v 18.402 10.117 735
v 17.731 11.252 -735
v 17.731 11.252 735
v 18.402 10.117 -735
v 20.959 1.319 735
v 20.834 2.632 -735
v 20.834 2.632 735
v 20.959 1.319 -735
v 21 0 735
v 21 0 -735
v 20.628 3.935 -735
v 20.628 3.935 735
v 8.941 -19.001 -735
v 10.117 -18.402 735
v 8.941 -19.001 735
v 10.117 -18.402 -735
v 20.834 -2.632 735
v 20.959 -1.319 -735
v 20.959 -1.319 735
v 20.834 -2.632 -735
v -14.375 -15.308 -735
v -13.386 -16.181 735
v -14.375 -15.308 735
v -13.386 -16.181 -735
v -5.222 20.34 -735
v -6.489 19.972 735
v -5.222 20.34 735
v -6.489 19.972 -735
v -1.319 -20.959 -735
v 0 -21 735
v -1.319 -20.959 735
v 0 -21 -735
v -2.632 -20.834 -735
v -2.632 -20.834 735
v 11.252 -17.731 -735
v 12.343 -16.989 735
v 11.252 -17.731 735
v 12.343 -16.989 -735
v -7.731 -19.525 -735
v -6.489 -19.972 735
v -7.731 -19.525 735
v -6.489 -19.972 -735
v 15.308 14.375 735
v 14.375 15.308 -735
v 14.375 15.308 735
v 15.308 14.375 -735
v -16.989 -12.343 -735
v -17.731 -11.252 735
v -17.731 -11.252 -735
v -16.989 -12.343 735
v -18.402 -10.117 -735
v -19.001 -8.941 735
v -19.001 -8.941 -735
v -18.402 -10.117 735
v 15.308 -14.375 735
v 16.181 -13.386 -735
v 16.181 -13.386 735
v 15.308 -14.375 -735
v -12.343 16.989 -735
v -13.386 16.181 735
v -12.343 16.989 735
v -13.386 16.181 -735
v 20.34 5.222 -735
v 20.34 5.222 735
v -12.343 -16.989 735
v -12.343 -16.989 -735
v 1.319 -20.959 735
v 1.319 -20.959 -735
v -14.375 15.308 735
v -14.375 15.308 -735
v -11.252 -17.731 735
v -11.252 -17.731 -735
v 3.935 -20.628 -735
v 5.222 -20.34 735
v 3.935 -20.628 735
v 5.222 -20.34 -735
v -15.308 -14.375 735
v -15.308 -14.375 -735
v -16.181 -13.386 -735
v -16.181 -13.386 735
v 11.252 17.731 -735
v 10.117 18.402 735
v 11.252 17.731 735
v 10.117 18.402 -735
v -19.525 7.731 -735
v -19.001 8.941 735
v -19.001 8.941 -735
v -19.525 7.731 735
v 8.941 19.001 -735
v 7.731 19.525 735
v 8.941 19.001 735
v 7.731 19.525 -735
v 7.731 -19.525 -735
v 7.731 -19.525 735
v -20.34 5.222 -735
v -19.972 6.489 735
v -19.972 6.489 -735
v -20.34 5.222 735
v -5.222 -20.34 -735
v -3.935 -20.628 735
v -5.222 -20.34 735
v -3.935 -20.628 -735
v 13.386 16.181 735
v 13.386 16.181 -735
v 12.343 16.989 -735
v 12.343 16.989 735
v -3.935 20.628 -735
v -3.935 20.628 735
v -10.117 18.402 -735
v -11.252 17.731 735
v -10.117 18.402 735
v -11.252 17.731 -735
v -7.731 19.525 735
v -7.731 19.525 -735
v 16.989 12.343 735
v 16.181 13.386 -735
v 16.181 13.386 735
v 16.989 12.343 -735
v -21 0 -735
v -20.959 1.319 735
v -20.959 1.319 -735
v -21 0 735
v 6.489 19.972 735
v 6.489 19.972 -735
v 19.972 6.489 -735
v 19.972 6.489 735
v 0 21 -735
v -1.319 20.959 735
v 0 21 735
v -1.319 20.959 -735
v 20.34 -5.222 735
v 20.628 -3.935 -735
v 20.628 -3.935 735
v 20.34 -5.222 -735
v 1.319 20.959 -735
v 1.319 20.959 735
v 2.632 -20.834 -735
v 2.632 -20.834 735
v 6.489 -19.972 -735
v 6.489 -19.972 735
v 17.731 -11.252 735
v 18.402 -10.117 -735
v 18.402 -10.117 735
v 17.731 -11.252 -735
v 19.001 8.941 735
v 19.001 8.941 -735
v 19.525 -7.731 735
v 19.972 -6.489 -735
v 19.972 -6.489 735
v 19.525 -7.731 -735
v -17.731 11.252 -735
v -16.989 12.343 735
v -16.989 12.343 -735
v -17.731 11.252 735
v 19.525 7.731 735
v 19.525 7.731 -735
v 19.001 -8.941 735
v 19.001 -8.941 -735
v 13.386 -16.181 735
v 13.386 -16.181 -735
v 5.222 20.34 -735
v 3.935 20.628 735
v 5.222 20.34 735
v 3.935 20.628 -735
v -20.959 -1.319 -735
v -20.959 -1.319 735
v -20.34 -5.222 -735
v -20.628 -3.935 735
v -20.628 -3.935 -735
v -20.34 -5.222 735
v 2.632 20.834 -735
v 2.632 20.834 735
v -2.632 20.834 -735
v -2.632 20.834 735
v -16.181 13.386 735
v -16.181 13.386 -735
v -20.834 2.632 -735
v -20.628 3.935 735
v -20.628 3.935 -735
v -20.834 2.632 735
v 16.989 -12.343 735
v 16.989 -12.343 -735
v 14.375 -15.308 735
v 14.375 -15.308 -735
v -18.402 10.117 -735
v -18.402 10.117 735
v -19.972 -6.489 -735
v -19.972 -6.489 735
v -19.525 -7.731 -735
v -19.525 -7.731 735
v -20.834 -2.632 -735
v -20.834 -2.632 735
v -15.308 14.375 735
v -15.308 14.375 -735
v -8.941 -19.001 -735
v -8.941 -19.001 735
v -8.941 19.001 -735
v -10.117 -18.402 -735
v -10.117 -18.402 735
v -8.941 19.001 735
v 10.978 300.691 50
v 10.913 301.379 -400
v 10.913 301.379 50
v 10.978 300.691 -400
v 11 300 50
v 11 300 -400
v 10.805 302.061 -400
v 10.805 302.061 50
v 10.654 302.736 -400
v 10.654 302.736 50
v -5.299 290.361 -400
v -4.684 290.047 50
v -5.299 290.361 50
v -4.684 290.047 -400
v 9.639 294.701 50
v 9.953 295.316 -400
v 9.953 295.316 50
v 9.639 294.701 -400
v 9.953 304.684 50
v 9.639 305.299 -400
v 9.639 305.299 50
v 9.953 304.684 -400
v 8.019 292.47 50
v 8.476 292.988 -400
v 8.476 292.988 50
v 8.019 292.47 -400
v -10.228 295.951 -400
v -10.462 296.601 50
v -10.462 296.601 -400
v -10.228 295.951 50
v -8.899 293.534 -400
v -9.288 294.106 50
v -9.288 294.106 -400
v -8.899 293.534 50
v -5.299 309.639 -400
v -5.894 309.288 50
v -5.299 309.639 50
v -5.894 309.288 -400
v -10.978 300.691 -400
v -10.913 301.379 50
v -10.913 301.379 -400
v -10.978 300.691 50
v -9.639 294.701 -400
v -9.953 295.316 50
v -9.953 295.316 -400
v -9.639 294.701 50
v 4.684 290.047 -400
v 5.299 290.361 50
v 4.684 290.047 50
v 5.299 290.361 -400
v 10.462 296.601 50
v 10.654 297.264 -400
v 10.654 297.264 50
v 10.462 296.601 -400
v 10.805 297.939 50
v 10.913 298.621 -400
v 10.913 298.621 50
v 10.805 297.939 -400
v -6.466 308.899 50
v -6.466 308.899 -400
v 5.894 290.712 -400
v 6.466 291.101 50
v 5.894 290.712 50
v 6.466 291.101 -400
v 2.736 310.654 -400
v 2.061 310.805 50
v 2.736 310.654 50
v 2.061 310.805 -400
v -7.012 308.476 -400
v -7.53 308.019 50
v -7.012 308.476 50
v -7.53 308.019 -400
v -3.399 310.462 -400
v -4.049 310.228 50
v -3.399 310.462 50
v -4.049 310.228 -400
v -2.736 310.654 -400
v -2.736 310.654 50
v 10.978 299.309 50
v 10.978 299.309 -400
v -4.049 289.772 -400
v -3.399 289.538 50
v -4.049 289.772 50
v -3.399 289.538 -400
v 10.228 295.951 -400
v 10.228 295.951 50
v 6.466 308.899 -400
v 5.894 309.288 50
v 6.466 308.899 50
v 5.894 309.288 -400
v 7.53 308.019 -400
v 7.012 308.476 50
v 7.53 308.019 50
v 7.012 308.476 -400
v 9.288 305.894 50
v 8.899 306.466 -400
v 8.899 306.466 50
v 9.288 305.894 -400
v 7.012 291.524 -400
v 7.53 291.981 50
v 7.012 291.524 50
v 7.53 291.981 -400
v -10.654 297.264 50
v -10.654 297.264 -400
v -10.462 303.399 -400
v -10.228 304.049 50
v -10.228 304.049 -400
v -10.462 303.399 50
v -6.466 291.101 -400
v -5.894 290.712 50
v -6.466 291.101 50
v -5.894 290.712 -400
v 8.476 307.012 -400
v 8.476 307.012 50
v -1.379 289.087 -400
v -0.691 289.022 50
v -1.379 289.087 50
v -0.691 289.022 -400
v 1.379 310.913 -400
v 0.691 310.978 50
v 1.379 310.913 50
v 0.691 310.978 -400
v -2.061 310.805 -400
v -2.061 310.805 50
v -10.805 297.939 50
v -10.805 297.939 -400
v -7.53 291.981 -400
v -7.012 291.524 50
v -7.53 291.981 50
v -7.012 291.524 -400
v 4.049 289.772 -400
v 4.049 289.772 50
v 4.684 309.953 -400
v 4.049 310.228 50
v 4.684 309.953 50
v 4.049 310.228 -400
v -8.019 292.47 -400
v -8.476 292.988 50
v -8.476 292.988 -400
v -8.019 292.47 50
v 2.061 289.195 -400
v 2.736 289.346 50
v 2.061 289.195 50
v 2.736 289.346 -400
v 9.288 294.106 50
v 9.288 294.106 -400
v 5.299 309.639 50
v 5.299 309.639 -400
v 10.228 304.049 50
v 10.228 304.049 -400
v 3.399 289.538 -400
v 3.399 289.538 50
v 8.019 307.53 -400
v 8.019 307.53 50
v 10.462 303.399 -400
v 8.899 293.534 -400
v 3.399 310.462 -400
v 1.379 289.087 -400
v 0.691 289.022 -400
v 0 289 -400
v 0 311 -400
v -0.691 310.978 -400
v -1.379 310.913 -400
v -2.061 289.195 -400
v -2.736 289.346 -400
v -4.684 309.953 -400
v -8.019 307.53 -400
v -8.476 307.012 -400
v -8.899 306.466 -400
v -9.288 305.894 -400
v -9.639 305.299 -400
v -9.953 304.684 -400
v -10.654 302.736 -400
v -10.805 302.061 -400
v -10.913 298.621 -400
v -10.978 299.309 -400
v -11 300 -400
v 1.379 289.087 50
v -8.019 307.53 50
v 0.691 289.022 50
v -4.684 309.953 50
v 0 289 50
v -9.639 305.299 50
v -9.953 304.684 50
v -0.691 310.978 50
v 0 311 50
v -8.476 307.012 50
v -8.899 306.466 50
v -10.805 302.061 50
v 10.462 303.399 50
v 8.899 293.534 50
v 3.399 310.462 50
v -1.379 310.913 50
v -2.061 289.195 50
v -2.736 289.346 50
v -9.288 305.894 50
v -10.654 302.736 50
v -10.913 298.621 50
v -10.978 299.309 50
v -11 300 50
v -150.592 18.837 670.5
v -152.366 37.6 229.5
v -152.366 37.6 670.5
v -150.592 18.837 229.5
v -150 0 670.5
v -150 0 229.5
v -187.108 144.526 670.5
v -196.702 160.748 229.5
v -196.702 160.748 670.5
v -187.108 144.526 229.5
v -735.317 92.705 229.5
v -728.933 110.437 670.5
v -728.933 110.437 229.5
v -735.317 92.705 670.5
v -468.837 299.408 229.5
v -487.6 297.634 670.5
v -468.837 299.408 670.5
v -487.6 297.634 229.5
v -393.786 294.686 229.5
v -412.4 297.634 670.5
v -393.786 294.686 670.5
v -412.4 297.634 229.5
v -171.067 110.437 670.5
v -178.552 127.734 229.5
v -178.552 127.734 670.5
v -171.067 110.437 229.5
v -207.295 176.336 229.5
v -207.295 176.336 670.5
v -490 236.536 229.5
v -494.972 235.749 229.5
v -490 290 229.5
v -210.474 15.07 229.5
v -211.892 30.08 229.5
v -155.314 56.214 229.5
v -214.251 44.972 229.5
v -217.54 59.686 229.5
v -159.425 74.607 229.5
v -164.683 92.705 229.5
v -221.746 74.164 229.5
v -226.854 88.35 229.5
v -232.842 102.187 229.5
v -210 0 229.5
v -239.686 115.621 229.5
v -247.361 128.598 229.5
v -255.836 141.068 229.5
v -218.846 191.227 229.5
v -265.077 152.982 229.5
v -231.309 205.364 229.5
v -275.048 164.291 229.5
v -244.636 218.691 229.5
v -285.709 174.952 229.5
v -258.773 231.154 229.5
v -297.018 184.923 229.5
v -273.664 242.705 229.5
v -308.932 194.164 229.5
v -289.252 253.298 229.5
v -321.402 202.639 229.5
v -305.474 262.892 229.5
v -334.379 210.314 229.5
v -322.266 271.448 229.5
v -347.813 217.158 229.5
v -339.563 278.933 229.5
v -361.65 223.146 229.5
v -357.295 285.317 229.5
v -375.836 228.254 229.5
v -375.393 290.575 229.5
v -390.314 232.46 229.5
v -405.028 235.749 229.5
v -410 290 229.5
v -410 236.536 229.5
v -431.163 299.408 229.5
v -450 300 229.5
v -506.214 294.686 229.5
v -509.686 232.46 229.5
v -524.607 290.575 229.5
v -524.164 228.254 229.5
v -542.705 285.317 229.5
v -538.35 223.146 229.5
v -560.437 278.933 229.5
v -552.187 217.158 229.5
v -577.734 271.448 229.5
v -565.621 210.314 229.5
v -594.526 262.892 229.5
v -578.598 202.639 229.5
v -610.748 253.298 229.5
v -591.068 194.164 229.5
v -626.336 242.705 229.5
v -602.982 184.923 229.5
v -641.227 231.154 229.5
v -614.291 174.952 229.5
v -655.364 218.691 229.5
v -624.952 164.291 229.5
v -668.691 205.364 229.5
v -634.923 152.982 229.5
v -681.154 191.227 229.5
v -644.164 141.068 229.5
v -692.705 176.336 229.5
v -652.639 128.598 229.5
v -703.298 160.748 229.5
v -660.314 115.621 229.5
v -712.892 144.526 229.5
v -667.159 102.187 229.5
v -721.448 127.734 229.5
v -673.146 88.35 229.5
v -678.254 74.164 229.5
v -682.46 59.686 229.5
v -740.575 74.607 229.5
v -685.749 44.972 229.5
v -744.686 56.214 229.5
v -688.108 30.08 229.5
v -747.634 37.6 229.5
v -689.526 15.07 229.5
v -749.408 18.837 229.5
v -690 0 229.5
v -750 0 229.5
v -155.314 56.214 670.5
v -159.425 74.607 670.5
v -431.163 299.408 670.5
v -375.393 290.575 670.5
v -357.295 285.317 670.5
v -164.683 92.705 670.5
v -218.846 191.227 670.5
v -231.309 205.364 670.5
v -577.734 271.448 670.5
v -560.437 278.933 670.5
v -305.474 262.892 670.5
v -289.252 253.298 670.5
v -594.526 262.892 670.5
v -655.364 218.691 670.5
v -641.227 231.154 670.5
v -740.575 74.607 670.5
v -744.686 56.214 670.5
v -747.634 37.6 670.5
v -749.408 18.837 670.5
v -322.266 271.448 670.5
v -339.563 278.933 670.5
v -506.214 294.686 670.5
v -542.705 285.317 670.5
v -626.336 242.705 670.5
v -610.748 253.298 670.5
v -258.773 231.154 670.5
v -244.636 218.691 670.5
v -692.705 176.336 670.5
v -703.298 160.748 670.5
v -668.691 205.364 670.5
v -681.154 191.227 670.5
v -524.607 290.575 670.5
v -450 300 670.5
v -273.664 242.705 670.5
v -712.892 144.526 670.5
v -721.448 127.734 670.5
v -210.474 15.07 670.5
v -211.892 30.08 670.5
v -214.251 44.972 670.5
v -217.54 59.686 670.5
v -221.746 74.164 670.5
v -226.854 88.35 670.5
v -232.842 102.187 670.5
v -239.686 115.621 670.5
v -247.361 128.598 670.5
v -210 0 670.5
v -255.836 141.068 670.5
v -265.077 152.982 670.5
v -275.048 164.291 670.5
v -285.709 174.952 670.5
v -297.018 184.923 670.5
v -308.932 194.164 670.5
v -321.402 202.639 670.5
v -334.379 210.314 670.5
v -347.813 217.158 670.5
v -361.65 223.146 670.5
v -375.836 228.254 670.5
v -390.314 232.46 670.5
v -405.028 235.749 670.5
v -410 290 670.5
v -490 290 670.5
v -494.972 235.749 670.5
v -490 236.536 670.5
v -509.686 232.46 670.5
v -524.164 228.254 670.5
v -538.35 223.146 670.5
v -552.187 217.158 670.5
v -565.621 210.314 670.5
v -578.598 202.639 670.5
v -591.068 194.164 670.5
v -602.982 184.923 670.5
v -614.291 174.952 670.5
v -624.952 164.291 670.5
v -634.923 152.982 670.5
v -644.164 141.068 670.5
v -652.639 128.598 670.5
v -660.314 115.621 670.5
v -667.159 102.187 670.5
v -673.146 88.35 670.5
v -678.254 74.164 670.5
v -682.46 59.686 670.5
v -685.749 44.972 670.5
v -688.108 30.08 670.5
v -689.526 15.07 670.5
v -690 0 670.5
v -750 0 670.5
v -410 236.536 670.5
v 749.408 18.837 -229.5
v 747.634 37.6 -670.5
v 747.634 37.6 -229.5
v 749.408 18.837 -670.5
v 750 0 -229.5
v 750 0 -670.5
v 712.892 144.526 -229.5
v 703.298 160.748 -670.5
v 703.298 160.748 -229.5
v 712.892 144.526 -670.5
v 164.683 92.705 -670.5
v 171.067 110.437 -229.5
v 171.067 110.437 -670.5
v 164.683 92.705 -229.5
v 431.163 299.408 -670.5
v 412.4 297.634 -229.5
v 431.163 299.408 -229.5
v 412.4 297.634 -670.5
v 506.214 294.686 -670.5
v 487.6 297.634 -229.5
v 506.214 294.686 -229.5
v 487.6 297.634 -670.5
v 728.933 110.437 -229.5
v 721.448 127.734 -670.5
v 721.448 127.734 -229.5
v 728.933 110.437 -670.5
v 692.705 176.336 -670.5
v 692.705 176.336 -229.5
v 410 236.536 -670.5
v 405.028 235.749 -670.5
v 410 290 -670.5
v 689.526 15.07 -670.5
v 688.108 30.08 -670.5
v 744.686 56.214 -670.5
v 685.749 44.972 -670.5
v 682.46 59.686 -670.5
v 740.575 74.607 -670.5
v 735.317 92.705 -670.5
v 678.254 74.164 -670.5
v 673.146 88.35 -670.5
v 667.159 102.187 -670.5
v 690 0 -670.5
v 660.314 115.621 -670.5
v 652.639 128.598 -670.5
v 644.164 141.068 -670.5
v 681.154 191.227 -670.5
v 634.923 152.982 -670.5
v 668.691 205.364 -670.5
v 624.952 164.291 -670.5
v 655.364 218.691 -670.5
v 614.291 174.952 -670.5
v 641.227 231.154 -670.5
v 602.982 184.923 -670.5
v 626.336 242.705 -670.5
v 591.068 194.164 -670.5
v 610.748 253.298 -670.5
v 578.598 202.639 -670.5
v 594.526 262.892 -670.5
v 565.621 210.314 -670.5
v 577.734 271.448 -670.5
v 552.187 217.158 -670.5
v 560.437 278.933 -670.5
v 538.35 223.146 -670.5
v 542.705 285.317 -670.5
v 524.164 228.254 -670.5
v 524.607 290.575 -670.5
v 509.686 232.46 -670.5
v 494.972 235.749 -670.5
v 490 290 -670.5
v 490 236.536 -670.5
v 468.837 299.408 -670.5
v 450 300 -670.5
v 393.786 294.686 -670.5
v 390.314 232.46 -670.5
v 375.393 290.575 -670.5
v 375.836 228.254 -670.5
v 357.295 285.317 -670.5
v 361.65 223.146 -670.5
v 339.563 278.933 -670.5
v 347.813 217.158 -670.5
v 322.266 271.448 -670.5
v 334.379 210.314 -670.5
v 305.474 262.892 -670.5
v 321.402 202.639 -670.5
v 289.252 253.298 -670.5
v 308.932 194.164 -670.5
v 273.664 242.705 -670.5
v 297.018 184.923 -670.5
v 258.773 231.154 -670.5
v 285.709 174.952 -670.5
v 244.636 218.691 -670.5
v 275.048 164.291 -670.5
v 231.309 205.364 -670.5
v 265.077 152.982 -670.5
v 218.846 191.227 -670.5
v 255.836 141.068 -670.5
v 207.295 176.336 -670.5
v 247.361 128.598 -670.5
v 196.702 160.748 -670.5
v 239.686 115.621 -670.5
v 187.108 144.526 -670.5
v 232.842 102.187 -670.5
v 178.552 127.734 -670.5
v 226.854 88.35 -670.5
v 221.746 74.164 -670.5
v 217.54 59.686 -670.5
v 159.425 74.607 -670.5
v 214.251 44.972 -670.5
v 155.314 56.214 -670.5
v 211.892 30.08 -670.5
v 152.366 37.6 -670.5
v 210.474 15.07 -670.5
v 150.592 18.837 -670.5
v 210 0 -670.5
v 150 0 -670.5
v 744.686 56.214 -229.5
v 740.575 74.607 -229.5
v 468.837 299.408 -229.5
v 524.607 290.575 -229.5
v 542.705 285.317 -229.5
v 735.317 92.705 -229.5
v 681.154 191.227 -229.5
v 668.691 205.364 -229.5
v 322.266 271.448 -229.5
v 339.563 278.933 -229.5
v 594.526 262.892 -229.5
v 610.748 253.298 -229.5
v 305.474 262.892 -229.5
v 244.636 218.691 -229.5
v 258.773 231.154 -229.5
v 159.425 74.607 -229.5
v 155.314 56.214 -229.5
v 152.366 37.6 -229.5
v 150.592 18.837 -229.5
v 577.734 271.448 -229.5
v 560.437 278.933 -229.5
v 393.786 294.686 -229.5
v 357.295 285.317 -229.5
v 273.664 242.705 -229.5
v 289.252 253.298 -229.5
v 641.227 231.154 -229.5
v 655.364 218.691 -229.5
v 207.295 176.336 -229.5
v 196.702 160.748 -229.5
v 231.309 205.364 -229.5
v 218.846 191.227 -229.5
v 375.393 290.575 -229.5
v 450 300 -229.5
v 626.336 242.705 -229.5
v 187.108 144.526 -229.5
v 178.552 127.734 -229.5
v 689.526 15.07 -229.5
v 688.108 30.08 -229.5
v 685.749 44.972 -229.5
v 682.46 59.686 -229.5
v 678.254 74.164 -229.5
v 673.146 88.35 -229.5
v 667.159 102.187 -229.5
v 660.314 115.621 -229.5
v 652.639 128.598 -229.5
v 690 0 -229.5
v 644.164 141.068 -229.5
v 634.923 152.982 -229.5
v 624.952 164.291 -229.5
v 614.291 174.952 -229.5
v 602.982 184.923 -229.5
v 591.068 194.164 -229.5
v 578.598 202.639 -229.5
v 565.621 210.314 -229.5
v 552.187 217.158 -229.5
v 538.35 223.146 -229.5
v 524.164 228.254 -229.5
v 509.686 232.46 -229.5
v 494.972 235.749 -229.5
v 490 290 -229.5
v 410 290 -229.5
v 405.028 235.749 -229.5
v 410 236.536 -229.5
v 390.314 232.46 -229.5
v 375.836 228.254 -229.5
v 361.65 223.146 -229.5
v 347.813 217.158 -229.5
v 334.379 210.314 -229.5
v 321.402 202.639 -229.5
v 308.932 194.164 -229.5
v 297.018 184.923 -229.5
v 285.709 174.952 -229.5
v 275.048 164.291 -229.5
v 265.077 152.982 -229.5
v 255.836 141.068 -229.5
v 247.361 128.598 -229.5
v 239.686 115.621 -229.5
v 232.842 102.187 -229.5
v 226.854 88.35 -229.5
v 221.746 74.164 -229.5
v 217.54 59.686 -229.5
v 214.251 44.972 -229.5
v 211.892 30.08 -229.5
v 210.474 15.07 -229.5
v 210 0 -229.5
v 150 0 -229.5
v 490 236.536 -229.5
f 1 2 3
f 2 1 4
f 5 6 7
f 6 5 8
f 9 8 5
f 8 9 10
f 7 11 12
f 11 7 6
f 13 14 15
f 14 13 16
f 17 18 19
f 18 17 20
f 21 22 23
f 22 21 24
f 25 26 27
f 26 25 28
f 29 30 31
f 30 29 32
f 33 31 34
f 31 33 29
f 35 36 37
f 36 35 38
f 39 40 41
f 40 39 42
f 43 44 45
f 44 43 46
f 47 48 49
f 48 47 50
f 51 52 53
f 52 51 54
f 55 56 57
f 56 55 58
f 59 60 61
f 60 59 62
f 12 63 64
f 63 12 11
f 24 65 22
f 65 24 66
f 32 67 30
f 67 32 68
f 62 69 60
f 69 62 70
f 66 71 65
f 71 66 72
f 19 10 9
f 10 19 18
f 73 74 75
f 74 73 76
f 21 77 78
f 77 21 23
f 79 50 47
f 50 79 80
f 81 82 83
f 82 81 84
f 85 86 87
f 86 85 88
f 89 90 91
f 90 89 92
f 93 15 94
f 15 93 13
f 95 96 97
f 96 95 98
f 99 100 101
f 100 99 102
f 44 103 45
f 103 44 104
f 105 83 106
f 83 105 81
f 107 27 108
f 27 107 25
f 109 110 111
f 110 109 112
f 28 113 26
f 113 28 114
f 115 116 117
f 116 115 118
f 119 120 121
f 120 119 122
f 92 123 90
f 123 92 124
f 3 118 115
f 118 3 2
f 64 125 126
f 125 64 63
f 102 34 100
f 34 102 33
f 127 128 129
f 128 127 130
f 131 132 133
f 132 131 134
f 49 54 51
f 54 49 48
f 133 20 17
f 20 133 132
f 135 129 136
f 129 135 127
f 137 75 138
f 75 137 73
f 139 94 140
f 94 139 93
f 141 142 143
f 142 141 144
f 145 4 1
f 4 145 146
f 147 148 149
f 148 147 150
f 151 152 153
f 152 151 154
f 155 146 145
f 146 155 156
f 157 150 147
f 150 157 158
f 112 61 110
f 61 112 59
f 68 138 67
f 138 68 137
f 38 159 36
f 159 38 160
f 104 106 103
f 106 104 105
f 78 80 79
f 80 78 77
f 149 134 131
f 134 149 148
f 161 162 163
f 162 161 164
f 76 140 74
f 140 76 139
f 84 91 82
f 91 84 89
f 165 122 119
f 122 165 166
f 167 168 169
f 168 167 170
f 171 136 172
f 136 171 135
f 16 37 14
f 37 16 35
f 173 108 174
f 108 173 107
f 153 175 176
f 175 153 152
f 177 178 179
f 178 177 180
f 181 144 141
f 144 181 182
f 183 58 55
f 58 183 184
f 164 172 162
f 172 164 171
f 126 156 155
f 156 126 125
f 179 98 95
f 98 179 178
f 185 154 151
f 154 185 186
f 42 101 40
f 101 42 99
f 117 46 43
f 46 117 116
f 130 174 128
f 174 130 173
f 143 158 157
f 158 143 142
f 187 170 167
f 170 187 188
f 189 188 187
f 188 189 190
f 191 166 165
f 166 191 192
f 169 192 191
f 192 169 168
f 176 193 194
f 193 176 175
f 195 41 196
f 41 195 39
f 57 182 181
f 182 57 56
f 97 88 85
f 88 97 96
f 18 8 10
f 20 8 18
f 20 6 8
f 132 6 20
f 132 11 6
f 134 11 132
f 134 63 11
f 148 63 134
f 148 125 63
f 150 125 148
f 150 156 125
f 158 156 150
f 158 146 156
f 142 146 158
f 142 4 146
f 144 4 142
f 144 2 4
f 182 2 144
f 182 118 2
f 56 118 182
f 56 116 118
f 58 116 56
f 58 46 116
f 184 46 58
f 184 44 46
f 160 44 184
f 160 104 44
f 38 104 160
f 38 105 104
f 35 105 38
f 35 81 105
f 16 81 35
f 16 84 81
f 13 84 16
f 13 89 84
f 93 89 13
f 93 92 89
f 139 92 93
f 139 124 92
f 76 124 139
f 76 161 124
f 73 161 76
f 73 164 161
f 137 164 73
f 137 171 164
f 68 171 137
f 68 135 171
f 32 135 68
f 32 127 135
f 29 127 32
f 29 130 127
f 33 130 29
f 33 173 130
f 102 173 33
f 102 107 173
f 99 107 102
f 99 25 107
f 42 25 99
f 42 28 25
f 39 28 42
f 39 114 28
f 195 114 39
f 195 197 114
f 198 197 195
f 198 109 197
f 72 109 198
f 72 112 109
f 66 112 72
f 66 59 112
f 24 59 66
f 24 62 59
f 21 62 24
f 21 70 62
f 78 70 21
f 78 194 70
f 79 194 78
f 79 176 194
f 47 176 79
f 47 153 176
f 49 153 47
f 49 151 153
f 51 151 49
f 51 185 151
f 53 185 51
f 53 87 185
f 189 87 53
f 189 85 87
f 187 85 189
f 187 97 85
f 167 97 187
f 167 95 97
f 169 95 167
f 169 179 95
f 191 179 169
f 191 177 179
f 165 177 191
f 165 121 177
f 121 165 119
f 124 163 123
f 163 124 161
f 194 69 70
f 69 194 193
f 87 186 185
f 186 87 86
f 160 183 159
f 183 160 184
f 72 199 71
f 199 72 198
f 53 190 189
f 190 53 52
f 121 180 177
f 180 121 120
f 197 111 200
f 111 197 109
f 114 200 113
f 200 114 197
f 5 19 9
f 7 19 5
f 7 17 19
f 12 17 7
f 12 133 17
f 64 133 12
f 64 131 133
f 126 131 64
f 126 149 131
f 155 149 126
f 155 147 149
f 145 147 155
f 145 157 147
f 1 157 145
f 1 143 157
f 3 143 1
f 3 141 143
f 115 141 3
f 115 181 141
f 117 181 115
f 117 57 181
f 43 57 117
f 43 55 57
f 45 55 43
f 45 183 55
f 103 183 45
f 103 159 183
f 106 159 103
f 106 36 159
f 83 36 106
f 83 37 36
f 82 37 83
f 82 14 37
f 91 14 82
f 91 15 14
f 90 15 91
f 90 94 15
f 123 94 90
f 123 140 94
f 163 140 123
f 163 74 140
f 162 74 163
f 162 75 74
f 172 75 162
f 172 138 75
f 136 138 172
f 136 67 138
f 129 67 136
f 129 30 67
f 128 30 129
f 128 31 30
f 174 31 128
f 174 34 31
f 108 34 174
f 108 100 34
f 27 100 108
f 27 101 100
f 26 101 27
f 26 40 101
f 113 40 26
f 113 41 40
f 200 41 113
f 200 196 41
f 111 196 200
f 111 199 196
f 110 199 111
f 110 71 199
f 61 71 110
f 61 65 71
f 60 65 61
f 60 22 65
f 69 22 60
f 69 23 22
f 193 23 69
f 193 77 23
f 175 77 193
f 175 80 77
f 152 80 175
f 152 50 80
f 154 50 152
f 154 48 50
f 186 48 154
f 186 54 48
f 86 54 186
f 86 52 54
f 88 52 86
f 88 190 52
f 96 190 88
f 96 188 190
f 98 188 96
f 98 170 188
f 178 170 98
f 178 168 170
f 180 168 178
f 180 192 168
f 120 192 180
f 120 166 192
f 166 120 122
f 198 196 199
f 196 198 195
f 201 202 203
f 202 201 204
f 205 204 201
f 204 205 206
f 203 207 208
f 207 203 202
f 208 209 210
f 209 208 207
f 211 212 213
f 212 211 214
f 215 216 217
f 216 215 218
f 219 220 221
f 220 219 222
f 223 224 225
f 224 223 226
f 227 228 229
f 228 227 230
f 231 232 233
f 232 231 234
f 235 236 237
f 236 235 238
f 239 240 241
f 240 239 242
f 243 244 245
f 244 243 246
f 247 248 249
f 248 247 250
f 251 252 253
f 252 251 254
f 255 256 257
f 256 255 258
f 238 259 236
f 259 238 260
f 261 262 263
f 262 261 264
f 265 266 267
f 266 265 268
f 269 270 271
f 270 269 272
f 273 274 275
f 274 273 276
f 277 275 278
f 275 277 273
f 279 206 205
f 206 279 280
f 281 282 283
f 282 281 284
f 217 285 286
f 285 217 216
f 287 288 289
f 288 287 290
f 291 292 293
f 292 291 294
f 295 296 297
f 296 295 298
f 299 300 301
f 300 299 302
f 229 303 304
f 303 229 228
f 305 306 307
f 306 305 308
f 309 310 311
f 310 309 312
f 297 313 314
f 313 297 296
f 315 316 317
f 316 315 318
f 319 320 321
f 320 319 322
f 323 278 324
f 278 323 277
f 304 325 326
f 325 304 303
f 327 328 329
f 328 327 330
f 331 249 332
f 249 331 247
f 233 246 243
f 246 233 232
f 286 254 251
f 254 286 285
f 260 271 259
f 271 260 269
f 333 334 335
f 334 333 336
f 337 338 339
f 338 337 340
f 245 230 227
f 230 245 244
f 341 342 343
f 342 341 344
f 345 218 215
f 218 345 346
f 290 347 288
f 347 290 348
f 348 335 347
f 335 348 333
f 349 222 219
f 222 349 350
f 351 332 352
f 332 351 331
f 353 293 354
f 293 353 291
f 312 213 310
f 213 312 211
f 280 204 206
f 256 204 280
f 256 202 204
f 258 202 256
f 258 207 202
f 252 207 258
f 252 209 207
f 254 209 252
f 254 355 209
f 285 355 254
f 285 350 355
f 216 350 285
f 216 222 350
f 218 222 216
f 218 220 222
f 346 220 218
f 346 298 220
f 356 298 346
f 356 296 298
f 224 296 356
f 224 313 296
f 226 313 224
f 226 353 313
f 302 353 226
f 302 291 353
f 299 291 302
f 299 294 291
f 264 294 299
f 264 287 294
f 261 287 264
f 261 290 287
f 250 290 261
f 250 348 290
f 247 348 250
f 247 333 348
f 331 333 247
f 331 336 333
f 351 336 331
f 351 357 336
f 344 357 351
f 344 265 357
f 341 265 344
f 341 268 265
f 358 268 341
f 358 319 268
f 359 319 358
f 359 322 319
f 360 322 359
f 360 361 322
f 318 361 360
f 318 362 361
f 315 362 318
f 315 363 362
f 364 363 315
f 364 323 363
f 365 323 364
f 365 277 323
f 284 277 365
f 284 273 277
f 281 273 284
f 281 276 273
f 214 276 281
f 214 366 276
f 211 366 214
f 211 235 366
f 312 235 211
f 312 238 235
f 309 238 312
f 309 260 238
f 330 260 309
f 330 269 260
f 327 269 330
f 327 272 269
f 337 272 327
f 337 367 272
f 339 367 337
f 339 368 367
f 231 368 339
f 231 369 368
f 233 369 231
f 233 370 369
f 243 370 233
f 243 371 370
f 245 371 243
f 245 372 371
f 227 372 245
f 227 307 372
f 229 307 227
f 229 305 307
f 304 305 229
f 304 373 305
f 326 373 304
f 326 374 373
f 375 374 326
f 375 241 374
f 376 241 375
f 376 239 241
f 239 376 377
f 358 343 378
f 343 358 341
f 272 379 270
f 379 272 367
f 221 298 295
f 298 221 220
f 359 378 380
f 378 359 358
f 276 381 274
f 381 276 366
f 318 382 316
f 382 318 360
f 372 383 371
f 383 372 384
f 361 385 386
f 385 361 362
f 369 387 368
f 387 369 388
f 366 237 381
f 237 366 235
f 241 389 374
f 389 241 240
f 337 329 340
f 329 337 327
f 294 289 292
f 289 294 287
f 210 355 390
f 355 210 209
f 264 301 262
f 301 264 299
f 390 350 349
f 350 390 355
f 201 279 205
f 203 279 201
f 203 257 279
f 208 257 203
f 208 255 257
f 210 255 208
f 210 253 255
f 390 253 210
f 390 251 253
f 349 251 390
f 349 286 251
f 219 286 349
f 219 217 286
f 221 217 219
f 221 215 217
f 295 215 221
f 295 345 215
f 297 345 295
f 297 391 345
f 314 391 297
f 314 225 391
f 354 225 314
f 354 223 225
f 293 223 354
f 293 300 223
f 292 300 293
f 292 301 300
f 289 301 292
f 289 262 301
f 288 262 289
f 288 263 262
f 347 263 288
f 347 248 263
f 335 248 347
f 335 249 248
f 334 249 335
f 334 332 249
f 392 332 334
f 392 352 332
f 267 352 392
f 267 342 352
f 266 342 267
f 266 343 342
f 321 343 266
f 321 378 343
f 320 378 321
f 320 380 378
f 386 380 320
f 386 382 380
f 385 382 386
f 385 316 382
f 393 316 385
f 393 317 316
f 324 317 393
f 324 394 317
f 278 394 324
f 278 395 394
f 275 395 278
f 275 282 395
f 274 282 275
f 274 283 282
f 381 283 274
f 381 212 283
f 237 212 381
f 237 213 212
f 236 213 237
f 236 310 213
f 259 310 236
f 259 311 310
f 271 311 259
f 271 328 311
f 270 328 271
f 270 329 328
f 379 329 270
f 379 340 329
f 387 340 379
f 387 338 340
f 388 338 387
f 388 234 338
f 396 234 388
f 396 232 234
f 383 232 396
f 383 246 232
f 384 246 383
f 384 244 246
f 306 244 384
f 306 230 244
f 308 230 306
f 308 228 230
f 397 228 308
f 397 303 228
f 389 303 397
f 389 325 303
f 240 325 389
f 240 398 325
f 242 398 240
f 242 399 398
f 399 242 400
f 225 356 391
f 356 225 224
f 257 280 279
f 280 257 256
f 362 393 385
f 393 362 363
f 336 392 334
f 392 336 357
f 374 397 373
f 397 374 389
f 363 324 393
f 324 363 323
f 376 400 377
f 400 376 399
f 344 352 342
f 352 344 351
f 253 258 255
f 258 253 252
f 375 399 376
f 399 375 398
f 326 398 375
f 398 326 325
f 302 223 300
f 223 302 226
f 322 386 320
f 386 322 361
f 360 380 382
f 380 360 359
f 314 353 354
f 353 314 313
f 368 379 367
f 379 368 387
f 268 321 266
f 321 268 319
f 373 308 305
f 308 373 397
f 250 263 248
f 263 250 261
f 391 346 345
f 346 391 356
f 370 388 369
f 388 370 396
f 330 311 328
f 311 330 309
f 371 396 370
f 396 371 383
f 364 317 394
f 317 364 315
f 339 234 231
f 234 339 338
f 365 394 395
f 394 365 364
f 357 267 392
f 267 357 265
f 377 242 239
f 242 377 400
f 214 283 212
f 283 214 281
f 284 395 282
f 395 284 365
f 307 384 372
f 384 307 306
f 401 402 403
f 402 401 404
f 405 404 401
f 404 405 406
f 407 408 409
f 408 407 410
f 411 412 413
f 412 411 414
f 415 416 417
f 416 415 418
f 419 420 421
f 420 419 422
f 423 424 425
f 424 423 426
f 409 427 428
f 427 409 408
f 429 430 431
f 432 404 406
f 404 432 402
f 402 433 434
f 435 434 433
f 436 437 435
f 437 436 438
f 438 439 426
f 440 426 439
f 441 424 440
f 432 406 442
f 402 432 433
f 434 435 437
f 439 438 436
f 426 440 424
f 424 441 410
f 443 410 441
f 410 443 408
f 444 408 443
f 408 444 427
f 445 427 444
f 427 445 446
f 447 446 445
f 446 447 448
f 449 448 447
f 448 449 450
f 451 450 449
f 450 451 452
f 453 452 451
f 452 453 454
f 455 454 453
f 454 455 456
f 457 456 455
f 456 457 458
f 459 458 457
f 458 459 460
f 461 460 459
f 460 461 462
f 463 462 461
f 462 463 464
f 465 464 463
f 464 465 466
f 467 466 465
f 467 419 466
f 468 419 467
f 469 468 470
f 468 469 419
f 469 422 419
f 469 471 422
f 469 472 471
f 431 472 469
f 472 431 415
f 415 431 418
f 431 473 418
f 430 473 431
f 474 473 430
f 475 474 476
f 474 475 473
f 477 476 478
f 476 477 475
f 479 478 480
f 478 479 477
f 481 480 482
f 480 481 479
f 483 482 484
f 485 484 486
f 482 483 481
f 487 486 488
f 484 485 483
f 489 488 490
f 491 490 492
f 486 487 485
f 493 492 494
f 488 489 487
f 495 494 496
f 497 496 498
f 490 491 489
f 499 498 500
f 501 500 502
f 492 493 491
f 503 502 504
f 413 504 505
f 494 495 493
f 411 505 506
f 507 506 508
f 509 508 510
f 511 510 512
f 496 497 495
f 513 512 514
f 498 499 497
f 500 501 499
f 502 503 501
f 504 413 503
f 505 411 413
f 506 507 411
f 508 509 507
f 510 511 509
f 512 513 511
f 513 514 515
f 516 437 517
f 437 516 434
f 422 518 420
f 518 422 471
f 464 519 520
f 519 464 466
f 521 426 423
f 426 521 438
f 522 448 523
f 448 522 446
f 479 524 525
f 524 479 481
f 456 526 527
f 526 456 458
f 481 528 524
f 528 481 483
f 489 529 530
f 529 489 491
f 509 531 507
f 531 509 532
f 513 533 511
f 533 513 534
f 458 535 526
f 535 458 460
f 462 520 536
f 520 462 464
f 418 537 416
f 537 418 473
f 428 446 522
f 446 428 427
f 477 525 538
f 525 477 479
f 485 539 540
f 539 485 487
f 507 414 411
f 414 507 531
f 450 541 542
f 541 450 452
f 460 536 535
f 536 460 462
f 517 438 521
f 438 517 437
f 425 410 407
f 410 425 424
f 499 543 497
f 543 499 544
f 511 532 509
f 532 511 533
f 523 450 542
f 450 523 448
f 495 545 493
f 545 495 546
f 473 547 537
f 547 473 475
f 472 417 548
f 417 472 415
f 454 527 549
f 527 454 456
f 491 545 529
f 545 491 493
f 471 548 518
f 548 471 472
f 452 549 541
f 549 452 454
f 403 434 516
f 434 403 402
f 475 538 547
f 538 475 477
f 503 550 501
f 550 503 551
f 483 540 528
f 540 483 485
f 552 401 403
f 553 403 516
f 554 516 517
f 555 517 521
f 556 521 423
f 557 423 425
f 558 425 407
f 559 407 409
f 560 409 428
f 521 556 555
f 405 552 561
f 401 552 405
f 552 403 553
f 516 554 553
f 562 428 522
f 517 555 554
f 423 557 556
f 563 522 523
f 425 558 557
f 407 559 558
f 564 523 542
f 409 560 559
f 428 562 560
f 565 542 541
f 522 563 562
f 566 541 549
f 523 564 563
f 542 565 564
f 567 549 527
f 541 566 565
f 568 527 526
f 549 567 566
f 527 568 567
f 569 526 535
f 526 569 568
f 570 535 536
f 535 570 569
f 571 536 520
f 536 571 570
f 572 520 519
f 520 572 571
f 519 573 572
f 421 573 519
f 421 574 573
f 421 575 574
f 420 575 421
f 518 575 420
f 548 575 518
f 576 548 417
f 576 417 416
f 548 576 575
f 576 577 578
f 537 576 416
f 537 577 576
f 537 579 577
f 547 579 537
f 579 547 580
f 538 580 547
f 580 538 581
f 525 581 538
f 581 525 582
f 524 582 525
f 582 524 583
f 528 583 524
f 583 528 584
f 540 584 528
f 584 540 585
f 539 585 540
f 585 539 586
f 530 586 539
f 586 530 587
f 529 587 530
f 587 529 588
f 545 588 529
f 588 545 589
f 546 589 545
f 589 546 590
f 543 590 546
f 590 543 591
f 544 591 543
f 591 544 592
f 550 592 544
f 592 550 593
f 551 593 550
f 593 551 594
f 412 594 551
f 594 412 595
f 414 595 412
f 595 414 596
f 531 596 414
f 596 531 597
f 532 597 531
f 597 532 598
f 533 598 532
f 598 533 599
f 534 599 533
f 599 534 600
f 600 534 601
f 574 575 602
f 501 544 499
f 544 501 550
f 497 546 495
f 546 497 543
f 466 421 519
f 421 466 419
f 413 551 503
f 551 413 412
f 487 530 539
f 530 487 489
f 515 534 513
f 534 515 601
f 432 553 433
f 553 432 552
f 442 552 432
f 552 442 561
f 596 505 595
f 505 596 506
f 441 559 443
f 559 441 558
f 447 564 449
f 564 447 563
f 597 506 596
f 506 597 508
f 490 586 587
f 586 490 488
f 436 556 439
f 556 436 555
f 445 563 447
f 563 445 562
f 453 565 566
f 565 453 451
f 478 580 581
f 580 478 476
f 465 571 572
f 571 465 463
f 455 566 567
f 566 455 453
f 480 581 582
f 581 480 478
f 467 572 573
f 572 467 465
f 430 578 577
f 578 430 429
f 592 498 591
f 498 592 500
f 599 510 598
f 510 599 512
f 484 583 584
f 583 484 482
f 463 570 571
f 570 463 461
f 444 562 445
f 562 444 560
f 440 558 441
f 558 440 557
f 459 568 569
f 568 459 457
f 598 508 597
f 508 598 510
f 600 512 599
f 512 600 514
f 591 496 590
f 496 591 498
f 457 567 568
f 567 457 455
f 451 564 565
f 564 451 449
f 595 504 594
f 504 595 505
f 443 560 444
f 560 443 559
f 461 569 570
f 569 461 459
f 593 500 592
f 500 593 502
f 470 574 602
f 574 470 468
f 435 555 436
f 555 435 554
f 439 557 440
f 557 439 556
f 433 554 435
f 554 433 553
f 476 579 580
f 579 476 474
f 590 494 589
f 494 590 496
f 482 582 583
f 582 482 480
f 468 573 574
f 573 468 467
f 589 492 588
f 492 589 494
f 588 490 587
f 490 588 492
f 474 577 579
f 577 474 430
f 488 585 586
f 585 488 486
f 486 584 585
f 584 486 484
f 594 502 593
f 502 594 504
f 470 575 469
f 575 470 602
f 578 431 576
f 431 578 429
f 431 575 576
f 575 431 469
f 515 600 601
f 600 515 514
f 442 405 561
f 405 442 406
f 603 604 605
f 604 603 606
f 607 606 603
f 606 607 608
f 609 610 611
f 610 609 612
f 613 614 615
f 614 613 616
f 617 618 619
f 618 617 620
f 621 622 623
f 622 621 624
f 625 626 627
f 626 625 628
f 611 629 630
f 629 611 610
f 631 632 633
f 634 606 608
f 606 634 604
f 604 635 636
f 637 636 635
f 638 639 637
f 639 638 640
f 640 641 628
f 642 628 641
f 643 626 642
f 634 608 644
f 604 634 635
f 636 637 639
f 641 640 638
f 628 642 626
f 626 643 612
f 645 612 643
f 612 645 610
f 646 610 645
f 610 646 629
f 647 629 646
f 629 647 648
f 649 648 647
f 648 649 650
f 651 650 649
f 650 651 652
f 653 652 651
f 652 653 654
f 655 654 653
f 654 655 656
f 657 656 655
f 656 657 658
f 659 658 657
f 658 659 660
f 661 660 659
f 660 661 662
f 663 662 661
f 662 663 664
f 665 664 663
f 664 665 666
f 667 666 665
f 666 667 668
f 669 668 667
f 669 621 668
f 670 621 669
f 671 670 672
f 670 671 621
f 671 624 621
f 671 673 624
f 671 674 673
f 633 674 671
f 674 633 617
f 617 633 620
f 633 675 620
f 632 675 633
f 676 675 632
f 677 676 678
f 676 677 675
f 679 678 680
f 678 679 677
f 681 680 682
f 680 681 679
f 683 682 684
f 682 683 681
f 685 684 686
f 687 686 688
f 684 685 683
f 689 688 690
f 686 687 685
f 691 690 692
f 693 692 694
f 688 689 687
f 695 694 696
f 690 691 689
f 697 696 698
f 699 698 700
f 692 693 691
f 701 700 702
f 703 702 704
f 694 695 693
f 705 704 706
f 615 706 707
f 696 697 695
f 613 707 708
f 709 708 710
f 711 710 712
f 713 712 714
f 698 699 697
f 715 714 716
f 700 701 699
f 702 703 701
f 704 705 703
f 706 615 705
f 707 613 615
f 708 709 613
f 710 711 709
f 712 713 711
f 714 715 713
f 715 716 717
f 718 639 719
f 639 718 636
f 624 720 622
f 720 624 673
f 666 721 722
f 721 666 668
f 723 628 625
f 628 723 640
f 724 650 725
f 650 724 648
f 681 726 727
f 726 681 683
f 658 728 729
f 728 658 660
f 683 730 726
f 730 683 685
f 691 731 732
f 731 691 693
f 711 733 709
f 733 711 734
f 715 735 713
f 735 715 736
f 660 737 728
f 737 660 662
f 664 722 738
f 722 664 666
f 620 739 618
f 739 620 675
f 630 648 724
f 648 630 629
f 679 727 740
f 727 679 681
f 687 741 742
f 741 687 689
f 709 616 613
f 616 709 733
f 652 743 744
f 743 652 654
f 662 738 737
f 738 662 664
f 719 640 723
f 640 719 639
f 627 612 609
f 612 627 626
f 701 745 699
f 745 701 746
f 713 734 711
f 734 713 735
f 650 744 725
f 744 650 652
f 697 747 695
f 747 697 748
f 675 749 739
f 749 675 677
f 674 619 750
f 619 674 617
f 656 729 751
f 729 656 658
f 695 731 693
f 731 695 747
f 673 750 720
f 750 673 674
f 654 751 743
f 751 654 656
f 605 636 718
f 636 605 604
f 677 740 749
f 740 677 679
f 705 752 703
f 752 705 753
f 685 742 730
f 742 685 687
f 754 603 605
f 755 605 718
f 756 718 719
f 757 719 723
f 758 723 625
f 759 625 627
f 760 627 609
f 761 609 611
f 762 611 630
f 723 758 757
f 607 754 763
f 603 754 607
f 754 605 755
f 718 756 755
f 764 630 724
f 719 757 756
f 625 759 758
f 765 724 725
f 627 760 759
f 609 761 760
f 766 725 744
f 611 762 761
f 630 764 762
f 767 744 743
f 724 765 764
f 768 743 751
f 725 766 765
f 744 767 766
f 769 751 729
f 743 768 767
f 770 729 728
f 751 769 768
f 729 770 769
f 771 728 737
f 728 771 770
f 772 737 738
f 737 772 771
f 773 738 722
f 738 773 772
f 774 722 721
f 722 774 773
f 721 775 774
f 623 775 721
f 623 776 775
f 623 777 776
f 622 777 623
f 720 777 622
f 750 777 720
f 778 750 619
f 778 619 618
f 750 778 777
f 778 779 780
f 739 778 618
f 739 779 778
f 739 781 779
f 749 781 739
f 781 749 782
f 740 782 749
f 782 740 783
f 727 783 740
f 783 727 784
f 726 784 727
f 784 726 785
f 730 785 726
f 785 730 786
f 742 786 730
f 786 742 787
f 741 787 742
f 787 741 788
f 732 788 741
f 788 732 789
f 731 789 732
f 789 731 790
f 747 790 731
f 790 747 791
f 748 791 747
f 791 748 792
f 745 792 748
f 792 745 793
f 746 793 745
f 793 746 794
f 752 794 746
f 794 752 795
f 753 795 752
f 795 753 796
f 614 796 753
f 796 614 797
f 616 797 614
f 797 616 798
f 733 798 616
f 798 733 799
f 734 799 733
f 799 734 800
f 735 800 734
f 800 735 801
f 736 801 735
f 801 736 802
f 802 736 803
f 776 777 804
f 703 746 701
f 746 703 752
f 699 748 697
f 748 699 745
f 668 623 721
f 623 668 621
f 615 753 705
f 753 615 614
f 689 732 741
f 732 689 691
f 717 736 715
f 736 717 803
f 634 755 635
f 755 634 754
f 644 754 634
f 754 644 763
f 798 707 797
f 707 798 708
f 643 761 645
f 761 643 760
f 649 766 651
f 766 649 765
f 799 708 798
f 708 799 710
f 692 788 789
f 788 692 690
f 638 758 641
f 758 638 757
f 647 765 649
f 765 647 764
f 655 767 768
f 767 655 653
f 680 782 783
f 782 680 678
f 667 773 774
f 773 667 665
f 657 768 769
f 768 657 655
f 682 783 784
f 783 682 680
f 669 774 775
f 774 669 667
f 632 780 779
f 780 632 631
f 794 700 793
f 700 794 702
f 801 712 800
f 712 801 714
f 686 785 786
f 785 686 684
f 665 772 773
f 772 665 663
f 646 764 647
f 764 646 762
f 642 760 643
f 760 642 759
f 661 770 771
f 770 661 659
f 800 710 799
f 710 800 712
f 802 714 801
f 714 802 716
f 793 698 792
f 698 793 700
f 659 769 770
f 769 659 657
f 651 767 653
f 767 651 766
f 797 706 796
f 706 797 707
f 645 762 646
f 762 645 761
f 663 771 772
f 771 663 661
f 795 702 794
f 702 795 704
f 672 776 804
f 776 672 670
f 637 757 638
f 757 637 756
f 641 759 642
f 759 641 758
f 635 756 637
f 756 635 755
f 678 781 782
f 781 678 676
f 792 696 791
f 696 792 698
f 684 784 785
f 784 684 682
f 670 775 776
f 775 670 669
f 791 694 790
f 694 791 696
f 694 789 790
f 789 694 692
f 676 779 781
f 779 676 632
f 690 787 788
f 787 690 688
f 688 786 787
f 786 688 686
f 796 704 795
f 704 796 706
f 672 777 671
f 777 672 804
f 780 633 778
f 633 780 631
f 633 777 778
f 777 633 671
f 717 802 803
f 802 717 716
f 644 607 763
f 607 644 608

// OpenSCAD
// ============================================================================
// PROJECT: XXXG-00W0 WING GUNDAM ZERO EW - LOWER LIMB ARTICULATION INFRA
// COMPONENT VAULT: BANDAI CAST RUNNER F - KNEE KNUCKLES F1 & F2
// PACKAGING RE-ARCHITECTURE: SUB-ARMOR CAPACITOR RECESSED BANK INTEGRATION
// CONFIG METRIC: SCALED TITANIUM CASTS (1:1 ACTUAL METRIC UP-SCALE)
// ============================================================================

$fn = 100; // Circular segment rendering resolution count

// Structural Constants Scaled 1:1 for a 16.7-Meter Airframe Scale (mm)
knee_joint_length = 980;                // Total longitudinal vertical height (mm)
knee_bore_diameter = 480;               // Core cycloidal hinge pin track width (mm)
armor_skin_thickness = 60;              // Solid TiAl protective plating wall (mm)
harness_conduit_width = 80;             // Cast-in 4oz copper logic trace track (mm)
capacitor_pocket_depth = 15;            // Sub-armor recessed housing pocket depth (mm)
capacitor_pocket_width = 140;           // Transverse MLCC array pocket width (mm)

module Runner_F_Knee_Forge() {
    // Central Supply Injection Runner Axis (Molten Feed Line from Siphon Forge)
    color([0.24, 0.24, 0.26]) {
        cylinder(h = knee_joint_length * 1.5, d = 42, center = true);
        // Direct injection gates tracking straight into the part mold cavities
        translate() rotate() cylinder(h = 450, d = 22);
        translate([0, 300, -400]) rotate() cylinder(h = 450, d = 22);
    }
    
    // Instantiate Scaled Skeutomorphic Part Molds Symmetrically (Left & Right)
    Cast_Internal_Knee_Knuckles();
}

module Cast_Internal_Knee_Knuckles() {
    // ---- PART F1: INTERNAL LEFT STRUCTURAL KNEE JOINT KNUCKLE ---- [Page 7, Step 5 / Page 7, Step 08-1]
    translate([-450, 0, 450]) color([0.35, 0.35, 0.38]) { // Inner Frame Dark Spec
        difference() {
            // Main solid heavy-duty core joint connection block segment
            cylinder(h = knee_joint_length * 0.45, d = knee_bore_diameter + (armor_skin_thickness * 2), center = true);
            
            // Central Cycloidal Reduction Track Bore (Houses pre-loaded rolling pins)
            cylinder(h = knee_joint_length * 0.5, d = knee_bore_diameter, center = true);
            
            // SUB-ARMOR RECESSED CAPACITOR POCKETS [Segmented rows cut inside the armor inner wall]
            for (z_offset = [-150, 0, 150]) {
                translate([0, (knee_bore_diameter/2 - armor_skin_thickness + capacitor_pocket_depth/2), z_offset])
                    cube([capacitor_pocket_width, capacitor_pocket_depth, 100], center = true);
            }
            
            // Continuous cast-in routing track for the 4oz solid-state wiring rails
            cube([harness_conduit_width, knee_bore_diameter + 100, knee_joint_length], center = true);
            
            // Slicing profile tool to generate an asymmetrical half-shell part component
            translate([0, -knee_bore_diameter, 0])
                cube([knee_bore_diameter * 2, knee_bore_diameter * 2, knee_joint_length * 2], center = true);
        }
    }
    
    // ---- PART F2: INTERNAL RIGHT STRUCTURAL KNEE JOINT KNUCKLE ---- [Page 7, Step 5 / Page 7, Step 08-1]
    translate([450, 0, -450]) rotate() color([0.35, 0.35, 0.38]) {
        difference() {
            cylinder(h = knee_joint_length * 0.45, d = knee_bore_diameter + (armor_skin_thickness * 2), center = true);
            cylinder(h = knee_joint_length * 0.5, d = knee_bore_diameter, center = true);
            
            for (z_offset = [-150, 0, 150]) {
                translate([0, (knee_bore_diameter/2 - armor_skin_thickness + capacitor_pocket_depth/2), z_offset])
                    cube([capacitor_pocket_width, capacitor_pocket_depth, 100], center = true);
            }
            
            cube([harness_conduit_width, knee_bore_diameter + 100, knee_joint_length], center = true);
            translate([0, -knee_bore_diameter, 0])
                cube([knee_bore_diameter * 2, knee_bore_diameter * 2, knee_joint_length * 2], center = true);
        }
    }
}

// Render Master Assembly to Parameter Workspace
Runner_F_Knee_Forge();
